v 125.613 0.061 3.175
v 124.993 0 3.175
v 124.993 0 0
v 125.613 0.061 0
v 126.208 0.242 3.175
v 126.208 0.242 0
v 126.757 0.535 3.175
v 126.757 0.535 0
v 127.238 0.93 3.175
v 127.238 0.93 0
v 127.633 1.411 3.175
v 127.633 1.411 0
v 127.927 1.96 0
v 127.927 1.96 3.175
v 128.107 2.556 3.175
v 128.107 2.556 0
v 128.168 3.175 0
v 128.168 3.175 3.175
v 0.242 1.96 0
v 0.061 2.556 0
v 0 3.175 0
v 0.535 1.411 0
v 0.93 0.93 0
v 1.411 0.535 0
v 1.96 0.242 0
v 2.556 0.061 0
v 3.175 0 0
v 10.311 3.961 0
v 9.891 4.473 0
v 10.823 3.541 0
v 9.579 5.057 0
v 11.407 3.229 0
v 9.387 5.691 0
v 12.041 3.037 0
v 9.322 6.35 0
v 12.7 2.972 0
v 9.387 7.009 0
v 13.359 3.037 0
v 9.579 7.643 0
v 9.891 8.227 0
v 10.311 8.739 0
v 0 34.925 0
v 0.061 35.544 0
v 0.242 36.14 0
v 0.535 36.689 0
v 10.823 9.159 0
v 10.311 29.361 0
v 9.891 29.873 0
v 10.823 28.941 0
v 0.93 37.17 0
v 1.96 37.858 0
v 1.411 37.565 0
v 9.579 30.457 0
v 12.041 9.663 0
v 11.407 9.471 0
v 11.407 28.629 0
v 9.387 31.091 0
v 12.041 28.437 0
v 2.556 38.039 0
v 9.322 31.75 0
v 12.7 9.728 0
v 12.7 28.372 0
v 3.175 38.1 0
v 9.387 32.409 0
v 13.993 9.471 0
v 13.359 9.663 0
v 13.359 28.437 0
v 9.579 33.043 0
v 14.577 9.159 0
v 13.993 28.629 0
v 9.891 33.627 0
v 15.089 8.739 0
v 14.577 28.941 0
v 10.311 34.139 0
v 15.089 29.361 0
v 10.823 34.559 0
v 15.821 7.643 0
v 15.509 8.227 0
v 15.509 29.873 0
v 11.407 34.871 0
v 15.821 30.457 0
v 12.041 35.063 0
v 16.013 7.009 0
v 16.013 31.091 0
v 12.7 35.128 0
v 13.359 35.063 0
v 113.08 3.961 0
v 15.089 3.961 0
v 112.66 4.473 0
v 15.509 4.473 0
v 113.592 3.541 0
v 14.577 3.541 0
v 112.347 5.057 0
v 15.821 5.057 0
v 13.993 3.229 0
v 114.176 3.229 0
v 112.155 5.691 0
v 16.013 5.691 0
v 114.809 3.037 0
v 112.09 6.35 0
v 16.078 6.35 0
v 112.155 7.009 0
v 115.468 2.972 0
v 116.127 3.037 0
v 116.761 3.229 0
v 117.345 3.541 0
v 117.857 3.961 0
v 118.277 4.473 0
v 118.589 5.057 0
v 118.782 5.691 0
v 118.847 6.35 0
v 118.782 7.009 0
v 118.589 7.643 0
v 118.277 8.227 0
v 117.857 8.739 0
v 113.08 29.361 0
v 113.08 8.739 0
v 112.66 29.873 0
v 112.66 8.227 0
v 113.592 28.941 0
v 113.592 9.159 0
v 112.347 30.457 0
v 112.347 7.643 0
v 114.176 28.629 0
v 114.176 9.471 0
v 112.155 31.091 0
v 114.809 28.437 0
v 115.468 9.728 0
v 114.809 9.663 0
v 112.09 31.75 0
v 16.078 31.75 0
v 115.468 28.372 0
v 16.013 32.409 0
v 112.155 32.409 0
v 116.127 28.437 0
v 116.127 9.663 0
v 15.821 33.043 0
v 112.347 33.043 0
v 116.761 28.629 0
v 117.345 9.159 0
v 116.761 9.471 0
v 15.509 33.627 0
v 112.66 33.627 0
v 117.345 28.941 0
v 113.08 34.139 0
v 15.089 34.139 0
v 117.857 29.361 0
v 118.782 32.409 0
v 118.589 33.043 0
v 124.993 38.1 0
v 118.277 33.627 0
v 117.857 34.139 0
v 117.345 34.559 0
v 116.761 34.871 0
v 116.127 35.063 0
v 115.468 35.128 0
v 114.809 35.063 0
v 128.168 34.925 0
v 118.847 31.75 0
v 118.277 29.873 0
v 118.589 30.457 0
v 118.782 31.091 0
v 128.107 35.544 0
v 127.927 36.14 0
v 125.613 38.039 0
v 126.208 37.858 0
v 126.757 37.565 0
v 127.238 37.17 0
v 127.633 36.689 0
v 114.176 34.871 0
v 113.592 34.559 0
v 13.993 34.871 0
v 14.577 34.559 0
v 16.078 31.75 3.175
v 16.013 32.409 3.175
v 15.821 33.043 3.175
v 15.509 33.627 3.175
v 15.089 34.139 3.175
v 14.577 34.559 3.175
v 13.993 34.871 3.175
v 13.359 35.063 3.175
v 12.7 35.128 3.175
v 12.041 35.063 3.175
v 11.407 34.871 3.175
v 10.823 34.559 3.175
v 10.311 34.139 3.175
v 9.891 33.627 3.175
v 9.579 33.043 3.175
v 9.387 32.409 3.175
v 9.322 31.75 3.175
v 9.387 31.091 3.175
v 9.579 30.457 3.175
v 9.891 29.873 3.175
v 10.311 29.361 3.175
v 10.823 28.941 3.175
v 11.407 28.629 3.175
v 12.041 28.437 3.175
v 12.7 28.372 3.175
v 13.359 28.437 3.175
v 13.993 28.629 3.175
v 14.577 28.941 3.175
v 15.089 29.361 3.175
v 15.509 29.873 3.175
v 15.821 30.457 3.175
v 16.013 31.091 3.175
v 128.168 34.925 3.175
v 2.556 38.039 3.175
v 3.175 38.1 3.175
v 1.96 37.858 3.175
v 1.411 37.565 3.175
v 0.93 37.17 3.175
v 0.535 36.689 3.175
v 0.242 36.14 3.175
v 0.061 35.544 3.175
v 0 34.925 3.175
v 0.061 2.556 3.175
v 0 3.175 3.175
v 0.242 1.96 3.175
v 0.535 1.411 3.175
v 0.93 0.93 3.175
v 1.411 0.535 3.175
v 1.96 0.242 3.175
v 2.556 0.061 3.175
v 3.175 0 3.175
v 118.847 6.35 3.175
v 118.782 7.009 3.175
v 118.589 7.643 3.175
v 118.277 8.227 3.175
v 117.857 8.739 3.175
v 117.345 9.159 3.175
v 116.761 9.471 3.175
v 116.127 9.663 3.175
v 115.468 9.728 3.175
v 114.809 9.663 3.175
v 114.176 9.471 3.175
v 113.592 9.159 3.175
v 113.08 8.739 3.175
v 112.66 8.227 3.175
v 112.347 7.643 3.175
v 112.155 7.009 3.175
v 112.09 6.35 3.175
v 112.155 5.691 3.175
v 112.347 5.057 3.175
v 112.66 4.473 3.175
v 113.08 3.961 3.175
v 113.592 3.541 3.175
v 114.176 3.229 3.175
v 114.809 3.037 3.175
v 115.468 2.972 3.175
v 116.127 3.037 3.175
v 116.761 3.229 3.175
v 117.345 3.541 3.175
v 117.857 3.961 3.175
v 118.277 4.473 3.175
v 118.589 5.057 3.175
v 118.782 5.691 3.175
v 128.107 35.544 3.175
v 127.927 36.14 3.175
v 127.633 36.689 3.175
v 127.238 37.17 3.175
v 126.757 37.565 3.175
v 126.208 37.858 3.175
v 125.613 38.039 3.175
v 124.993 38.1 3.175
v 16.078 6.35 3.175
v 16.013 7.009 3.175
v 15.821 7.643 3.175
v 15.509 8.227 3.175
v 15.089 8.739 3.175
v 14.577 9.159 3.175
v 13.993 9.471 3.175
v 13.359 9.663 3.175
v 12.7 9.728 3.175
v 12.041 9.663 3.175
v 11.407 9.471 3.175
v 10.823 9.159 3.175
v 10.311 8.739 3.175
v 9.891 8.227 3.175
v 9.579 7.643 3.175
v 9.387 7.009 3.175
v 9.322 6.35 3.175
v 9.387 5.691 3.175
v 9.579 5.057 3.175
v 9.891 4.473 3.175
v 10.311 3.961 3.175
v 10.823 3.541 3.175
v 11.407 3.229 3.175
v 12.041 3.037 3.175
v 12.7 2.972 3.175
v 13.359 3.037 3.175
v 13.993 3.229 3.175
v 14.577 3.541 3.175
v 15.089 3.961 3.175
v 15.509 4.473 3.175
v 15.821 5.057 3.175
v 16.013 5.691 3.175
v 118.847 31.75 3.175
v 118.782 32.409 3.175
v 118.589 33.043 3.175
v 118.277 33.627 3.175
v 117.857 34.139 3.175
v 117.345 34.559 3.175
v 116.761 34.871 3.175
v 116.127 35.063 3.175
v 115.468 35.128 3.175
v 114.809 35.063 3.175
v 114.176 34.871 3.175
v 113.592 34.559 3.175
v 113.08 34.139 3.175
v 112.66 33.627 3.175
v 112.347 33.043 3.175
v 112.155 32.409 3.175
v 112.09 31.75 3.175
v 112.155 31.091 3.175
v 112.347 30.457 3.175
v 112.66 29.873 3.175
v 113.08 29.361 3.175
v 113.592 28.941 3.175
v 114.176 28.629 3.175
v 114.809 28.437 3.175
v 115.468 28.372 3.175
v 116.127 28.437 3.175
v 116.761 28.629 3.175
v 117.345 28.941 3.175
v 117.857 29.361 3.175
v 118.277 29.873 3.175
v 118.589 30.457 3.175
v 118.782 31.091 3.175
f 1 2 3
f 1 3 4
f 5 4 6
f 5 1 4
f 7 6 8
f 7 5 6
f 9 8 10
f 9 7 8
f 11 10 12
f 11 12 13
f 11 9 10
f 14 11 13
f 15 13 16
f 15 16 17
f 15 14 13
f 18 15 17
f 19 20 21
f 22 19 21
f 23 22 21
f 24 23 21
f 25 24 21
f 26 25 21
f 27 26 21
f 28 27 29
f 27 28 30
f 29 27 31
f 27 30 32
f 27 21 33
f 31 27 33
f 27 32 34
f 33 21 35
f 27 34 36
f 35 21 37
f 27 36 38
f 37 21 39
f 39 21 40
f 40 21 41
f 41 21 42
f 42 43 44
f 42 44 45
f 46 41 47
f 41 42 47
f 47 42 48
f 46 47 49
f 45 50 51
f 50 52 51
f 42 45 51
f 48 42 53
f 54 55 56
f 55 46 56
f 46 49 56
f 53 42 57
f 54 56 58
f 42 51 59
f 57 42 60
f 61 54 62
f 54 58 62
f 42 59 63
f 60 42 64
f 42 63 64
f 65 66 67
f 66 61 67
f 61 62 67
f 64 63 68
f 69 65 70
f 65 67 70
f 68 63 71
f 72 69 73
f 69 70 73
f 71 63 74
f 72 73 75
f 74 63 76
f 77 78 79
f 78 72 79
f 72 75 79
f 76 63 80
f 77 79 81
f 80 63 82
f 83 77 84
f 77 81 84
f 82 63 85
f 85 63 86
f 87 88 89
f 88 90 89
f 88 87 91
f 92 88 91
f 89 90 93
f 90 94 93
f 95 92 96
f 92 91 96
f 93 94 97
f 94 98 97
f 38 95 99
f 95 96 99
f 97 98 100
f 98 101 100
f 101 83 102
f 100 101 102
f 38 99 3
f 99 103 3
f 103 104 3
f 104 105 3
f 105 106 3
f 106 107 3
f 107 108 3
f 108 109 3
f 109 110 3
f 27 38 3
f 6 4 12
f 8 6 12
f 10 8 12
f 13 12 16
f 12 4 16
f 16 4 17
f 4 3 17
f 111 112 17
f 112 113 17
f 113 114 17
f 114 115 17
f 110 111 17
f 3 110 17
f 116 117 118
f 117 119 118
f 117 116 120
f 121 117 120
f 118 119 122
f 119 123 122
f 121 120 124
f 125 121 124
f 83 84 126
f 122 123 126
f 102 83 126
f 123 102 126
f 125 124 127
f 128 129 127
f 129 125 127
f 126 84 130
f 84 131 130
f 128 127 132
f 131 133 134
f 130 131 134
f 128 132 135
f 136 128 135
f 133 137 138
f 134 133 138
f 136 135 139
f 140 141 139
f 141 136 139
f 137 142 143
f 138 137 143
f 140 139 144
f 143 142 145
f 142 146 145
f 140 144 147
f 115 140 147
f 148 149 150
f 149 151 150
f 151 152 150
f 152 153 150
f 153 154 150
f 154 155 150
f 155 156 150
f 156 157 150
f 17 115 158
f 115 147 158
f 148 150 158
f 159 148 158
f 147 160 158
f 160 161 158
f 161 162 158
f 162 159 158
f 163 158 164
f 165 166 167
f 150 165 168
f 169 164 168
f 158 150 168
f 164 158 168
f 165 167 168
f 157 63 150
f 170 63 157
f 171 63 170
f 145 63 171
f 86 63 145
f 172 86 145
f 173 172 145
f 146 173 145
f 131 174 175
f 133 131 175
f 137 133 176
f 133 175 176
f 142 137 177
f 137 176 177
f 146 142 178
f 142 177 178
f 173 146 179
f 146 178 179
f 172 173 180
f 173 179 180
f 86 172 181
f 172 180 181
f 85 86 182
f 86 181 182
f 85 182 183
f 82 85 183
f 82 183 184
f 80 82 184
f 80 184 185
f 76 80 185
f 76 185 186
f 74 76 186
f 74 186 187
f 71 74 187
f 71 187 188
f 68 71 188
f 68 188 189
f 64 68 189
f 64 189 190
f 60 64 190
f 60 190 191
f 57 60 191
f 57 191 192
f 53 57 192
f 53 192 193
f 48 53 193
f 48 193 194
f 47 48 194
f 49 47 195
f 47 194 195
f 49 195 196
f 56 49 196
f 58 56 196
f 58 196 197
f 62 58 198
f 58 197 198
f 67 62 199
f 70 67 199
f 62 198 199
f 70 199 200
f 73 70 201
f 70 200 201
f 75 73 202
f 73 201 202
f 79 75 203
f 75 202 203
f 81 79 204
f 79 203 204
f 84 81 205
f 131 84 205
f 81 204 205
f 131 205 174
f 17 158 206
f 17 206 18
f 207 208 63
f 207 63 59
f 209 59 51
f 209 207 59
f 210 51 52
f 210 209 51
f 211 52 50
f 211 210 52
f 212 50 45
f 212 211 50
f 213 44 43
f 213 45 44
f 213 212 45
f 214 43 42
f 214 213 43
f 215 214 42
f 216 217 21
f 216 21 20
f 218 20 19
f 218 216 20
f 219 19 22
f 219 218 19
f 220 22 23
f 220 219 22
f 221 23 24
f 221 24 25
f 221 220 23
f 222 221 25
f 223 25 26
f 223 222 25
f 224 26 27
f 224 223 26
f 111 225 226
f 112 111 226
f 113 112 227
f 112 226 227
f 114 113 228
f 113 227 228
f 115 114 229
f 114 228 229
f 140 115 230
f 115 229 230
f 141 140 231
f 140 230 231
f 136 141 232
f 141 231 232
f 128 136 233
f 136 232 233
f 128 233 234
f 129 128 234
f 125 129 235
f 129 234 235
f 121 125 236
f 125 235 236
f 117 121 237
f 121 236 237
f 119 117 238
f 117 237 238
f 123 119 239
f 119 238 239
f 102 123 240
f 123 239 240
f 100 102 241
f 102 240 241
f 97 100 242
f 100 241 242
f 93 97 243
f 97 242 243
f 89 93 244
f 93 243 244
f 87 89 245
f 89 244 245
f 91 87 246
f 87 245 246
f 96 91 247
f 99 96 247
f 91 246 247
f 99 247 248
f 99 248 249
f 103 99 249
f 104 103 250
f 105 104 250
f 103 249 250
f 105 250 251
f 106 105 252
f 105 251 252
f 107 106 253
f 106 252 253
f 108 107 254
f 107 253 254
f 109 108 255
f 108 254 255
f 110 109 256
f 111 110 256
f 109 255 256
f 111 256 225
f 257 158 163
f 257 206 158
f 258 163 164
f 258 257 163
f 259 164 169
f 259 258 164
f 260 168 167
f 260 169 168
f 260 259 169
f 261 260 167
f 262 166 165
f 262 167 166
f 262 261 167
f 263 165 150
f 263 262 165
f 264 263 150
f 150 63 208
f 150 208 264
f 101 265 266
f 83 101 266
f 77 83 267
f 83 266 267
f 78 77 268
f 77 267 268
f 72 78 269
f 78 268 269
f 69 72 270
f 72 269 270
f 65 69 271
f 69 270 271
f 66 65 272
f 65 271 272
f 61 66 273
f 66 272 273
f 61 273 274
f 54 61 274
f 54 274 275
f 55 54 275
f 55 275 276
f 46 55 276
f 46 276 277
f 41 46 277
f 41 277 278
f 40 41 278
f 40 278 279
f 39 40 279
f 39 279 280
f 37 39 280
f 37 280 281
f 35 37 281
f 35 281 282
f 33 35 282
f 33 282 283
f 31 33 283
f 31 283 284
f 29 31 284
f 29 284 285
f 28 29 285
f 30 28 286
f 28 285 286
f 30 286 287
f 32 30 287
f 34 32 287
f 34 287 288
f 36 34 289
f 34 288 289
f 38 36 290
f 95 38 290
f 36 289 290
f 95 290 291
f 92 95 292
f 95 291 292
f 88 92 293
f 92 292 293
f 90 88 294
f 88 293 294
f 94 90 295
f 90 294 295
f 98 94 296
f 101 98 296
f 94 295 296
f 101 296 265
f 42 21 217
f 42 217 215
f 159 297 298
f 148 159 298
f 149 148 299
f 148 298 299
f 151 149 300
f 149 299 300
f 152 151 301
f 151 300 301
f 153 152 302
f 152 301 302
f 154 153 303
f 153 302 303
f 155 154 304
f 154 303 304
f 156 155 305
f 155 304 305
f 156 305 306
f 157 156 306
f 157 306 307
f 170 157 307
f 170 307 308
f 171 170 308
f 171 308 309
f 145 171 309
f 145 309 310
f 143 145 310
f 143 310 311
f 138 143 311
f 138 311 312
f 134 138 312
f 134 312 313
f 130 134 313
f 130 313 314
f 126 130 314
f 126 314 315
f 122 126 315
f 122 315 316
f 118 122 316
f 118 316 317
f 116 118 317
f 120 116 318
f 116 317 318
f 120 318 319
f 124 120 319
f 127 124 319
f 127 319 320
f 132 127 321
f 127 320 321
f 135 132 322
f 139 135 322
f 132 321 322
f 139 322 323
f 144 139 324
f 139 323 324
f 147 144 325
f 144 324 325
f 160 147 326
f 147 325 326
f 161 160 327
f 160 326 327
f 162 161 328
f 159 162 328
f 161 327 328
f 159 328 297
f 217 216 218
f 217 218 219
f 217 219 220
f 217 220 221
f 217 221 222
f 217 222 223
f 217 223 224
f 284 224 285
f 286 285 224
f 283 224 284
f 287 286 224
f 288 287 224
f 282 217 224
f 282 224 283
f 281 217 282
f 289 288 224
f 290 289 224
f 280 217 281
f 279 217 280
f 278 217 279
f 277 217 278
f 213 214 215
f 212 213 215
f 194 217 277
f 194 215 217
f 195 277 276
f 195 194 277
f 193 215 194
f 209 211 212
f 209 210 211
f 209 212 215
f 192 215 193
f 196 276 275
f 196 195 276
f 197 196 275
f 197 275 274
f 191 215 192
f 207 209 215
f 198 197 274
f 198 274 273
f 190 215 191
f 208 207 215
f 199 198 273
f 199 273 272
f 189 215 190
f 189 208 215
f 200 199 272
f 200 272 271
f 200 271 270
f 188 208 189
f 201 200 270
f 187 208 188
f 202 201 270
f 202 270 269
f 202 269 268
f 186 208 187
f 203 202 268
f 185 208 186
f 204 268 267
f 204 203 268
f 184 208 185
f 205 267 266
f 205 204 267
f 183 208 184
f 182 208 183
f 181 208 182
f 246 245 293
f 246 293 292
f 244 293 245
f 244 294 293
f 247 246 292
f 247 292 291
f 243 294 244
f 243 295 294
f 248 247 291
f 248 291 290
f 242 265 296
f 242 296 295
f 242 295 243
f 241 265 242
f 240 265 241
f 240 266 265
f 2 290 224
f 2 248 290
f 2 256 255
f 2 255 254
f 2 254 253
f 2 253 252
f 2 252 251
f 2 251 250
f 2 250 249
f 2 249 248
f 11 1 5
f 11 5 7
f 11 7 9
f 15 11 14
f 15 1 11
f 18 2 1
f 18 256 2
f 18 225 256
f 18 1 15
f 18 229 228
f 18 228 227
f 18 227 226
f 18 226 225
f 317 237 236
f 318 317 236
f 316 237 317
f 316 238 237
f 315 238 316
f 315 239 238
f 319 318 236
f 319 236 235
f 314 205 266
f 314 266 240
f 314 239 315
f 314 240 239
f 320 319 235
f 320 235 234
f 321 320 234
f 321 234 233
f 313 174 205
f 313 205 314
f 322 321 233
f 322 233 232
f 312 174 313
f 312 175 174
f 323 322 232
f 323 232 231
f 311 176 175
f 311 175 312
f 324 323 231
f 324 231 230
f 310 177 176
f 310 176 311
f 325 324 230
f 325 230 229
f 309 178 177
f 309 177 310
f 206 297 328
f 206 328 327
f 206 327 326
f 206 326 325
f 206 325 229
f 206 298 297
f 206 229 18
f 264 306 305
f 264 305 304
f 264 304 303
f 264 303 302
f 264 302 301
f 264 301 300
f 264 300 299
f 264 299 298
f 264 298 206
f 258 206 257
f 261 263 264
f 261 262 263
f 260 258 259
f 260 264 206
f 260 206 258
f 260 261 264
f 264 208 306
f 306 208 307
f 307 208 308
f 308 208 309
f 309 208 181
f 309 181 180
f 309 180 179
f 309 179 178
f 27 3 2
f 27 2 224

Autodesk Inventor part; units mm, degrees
ref_plane "YZ Plane" through (0, 0, 0) normal (1, 0, 0) x (0, 1, 0)
ref_plane "XZ Plane" through (0, 0, 0) normal (0, 1, 0) x (-1, 0, 0)
ref_plane "XY Plane" through (0, 0, 0) normal (0, 0, 1) x (1, 0, 0)
sketch "Sketch1" plane through (0, 0, 0) normal (0, 0, 1) x (1, 0, 0)
  line L0 (0, 0) -> (0, 38.1)
  line L1 (0, 38.1) -> (128.1684, 38.1)
  line L2 (128.1684, 38.1) -> (128.1684, 0)
  line L3 (128.1684, 0) -> (0, 0)
  dimension "d0" = 38.1
  dimension "d1" = 128.1684
extrude "Extrusion1" add sketch "Sketch1" along normal blind 3.175
sketch "Sketch2" plane through (0, 0, 3.175) normal (0, 0, 1) x (1, 0, 0)
  line L0 (128.1684, 38.1) -> (0, 38.1) projected
  line L1 (0, 38.1) -> (12.7, 38.1)
  line L2 (12.7, 38.1) -> (12.7, 31.75)
  line L3 (12.7, 31.75) -> (12.7, 6.35)
  circle A0 centre (12.7, 31.75) radius 3.3782
  circle A1 centre (12.7, 6.35) radius 3.3782
  line L4 (128.1684, 38.1) -> (115.4684, 38.1)
  line L5 (115.4684, 38.1) -> (115.4684, 31.75)
  circle A2 centre (115.4684, 31.75) radius 3.3782
  circle A3 centre (115.4684, 6.35) radius 3.3782
  line L6 (115.4684, 6.35) -> (115.4684, 31.75)
  dimension "d4" = 12.7
  dimension "d5" = 6.35
  dimension "d6" = 25.4
  dimension "d7" = 6.7564
  dimension "d8" = 6.7564
  dimension "d9" = 12.7
  dimension "d10" = 6.35
  dimension "d11" = 6.7564
  dimension "d12" = 6.7564
  dimension "d13" = 25.4
extrude "Extrusion2" cut sketch "Sketch2" against normal blind 3.175
fillet "Fillet1" radius 3.175 4 edges at (128.1684, 38.1, 1.5875) (128.1684, 0, 1.5875) (0, 38.1, 1.5875) (0, 0, 1.5875)
sketch "Sketch3" plane through (0, 0, 3.175) normal (0, 0, 1) x (1, 0, 0)
  arc A0 (0, 3.175) -> (3.175, 0) centre (3.175, 3.175) ccw projected
  line L0 (3.175, 0) -> (124.9934, 0) projected
  arc A1 (124.9934, 0) -> (128.1684, 3.175) centre (124.9934, 3.175) ccw projected
  line L1 (128.1684, 3.175) -> (128.1684, 34.925) projected
  arc A2 (128.1684, 34.925) -> (124.9934, 38.1) centre (124.9934, 34.925) ccw projected
  line L2 (124.9934, 38.1) -> (3.175, 38.1) projected
  arc A3 (3.175, 38.1) -> (0, 34.925) centre (3.175, 34.925) ccw projected
  line L3 (0, 34.925) -> (0, 3.175) projected
  circle A4 centre (115.4684, 31.75) radius 3.3782 projected
  circle A5 centre (12.7, 31.75) radius 3.3782 projected
  circle A6 centre (12.7, 6.35) radius 3.3782 projected
  circle A7 centre (115.4684, 6.35) radius 3.3782 projected
  line L4 (128.1684, 38.1) -> (102.7684, 38.1)
  line L5 (102.7684, 38.1) -> (102.7684, 0)
  point P0 (0, 0)
  dimension "d17" = 25.4
properties part number "anti - chain tension" material "Aluminum 6061"
